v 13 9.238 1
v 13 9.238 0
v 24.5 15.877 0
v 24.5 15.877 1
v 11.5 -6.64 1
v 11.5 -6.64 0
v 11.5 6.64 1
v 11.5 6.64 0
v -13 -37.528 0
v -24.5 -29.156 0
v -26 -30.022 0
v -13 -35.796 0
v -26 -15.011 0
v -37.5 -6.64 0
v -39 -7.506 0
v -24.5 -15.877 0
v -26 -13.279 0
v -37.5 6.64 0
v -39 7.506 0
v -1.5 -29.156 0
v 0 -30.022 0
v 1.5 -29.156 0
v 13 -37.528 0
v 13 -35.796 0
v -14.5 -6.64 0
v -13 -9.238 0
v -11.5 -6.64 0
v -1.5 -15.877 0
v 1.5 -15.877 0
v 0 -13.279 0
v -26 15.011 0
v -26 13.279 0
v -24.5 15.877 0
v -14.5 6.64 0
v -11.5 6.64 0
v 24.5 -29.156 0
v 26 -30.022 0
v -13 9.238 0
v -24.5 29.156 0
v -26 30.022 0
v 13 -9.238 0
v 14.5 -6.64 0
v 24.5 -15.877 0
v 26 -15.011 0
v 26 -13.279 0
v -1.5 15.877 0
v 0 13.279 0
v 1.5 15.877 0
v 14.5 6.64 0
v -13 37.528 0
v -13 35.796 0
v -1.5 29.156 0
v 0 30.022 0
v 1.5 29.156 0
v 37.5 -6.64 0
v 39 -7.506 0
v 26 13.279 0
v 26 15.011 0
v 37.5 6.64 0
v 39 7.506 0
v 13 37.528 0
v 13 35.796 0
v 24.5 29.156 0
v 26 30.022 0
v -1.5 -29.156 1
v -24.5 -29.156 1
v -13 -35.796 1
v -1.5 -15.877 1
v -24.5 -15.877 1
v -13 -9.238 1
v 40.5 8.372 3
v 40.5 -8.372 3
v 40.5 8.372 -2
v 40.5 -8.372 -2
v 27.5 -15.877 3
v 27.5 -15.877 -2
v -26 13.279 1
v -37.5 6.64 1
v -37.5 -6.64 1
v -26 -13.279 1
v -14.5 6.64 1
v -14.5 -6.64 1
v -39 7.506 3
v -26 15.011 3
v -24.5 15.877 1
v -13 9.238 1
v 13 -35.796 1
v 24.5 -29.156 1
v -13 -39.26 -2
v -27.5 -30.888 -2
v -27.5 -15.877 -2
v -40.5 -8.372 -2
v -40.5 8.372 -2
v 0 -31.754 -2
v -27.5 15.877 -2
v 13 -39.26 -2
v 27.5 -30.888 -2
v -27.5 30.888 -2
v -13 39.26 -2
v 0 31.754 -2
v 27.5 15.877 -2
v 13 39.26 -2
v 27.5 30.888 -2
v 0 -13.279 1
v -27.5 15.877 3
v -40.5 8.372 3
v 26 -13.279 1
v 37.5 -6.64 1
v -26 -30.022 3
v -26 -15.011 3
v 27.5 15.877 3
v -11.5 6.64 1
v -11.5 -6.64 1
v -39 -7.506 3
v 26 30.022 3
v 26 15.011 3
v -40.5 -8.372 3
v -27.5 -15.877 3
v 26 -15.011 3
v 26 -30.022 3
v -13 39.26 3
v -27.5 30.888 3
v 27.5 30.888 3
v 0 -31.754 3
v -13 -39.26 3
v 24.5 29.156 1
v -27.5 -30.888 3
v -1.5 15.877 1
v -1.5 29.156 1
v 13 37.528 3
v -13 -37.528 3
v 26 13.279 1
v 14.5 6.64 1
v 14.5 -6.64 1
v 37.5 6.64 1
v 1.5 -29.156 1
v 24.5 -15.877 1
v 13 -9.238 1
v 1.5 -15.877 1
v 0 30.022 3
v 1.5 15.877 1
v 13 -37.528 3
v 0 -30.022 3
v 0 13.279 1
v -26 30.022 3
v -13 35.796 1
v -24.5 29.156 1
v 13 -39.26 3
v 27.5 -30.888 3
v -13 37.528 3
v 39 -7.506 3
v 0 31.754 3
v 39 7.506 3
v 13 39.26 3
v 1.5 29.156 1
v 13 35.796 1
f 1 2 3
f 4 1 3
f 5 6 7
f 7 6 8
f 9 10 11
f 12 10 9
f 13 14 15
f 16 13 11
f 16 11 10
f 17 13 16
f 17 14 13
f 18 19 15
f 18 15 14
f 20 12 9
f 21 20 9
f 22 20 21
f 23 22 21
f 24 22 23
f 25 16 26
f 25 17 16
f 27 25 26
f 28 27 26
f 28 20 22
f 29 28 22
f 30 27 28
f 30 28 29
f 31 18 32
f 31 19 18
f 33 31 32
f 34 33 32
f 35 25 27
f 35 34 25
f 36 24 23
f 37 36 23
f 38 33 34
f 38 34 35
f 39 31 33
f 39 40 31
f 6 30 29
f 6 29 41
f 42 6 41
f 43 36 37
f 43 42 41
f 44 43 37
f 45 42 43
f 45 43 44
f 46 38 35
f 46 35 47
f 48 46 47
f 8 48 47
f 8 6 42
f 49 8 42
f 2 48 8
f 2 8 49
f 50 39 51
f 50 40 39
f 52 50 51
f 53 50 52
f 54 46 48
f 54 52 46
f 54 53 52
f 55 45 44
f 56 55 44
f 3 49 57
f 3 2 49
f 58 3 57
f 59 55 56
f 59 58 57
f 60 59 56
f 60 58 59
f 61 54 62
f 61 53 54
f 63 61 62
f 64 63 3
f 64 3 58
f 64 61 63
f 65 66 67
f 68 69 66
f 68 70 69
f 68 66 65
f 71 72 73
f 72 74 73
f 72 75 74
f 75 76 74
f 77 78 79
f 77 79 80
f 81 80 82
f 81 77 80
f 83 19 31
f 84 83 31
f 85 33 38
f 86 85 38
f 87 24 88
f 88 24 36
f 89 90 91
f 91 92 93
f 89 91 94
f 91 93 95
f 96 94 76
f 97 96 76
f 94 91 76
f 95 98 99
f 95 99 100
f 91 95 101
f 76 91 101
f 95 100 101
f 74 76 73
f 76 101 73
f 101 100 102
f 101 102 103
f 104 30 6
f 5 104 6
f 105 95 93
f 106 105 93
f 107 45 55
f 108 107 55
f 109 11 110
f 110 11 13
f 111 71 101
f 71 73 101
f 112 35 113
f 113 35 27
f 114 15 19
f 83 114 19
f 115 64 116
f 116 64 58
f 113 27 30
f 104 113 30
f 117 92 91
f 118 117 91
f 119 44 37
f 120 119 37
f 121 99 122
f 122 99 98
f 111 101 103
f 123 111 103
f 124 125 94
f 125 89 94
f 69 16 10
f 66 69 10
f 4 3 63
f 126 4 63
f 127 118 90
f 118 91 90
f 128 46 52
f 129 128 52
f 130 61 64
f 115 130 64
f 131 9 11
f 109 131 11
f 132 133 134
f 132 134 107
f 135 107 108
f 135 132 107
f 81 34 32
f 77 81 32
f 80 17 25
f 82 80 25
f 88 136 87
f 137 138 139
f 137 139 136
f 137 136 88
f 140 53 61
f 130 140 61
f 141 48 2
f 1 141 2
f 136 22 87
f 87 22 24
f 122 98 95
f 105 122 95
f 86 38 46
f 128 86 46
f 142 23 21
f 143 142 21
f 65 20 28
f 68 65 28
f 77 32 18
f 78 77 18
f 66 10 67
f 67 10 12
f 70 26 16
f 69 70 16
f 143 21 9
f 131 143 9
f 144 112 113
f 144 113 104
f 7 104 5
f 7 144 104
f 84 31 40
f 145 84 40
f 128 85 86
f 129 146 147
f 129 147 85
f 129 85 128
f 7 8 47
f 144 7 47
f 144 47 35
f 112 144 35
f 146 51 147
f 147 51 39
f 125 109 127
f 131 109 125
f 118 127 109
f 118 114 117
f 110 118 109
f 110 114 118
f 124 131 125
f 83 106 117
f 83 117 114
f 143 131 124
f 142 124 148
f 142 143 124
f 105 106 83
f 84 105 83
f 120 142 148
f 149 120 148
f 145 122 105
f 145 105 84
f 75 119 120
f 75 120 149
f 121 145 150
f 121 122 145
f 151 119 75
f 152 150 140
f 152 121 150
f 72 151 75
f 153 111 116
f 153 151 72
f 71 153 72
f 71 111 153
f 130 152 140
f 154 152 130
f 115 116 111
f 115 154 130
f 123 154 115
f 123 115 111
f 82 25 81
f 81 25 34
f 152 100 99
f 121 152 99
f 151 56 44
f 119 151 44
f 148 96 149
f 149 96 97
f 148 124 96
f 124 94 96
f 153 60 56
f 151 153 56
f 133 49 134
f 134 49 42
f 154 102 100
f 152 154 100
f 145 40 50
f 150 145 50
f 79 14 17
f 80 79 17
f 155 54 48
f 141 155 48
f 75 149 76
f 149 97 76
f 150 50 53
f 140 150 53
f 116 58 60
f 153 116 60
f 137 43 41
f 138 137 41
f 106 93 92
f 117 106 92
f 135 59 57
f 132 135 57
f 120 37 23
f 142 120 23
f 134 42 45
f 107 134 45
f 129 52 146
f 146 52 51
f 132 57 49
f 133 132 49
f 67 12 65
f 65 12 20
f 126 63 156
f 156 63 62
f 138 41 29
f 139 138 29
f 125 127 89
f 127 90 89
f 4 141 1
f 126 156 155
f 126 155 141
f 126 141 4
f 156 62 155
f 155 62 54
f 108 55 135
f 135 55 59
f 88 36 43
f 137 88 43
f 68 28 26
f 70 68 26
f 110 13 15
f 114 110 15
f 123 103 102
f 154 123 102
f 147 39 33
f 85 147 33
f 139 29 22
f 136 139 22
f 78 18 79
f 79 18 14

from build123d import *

# Parameters (mm, degrees)
F1_DEPTH = 2
F2_DEPTH = 1
F3_DEPTH = 3


with BuildPart() as f1:
    # F0 (on Top) → F1 (new body)
    with BuildSketch(Plane.XY):
        Polygon((-40.5, -8.371579), (-27.5, -15.877132), (-27.5, -30.888239), (-13, -39.259818), (0, -31.754265), (13, -39.259818), (27.5, -30.888239), (27.5, -15.877132), (40.5, -8.371579), (40.5, 8.371579), (27.5, 15.877132), (27.5, 30.888239), (13, 39.259818), (0, 31.754265), (-13, 39.259818), (-27.5, 30.888239), (-27.5, 15.877132), (-40.5, 8.371579), align=None)
        Polygon((-39, -7.505553), (-39, 7.505553), (-26, 15.011107), (-26, 30.022214), (-13, 37.527767), (0, 30.022214), (13, 37.527767), (26, 30.022214), (26, 15.011107), (39, 7.505553), (39, -7.505553), (26, -15.011107), (26, -30.022214), (13, -37.527767), (0, -30.022214), (-13, -37.527767), (-26, -30.022214), (-26, -15.011107), align=None, mode=Mode.SUBTRACT)
        Polygon((-26, 15.011107), (-39, 7.505553), (-39, -7.505553), (-26, -15.011107), (-26, -30.022214), (-13, -37.527767), (0, -30.022214), (13, -37.527767), (26, -30.022214), (26, -15.011107), (39, -7.505553), (39, 7.505553), (26, 15.011107), (26, 30.022214), (13, 37.527767), (0, 30.022214), (-13, 37.527767), (-26, 30.022214), align=None)
        Polygon((-13, -35.795717), (-24.5, -29.156189), (-24.5, -15.877132), (-13, -9.237604), (-1.5, -15.877132), (-1.5, -29.156189), align=None, mode=Mode.SUBTRACT)
        Polygon((-26, -13.279056), (-37.5, -6.639528), (-37.5, 6.639528), (-26, 13.279056), (-14.5, 6.639528), (-14.5, -6.639528), align=None, mode=Mode.SUBTRACT)
        Polygon((13, -9.237604), (24.5, -15.877132), (24.5, -29.156189), (13, -35.795717), (1.5, -29.156189), (1.5, -15.877132), align=None, mode=Mode.SUBTRACT)
        Polygon((0, 13.279056), (11.5, 6.639528), (11.5, -6.639528), (0, -13.279056), (-11.5, -6.639528), (-11.5, 6.639528), align=None, mode=Mode.SUBTRACT)
        Polygon((26, 13.279056), (37.5, 6.639528), (37.5, -6.639528), (26, -13.279056), (14.5, -6.639528), (14.5, 6.639528), align=None, mode=Mode.SUBTRACT)
        Polygon((-13, 35.795717), (-1.5, 29.156189), (-1.5, 15.877132), (-13, 9.237604), (-24.5, 15.877132), (-24.5, 29.156189), align=None, mode=Mode.SUBTRACT)
        Polygon((13, 35.795717), (24.5, 29.156189), (24.5, 15.877132), (13, 9.237604), (1.5, 15.877132), (1.5, 29.156189), align=None, mode=Mode.SUBTRACT)
        Polygon((-37.5, 6.639528), (-37.5, -6.639528), (-26, -13.279056), (-14.5, -6.639528), (-14.5, 6.639528), (-26, 13.279056), align=None)
        Polygon((-1.5, 15.877132), (-1.5, 29.156189), (-13, 35.795717), (-24.5, 29.156189), (-24.5, 15.877132), (-13, 9.237604), align=None)
        Polygon((24.5, 15.877132), (24.5, 29.156189), (13, 35.795717), (1.5, 29.156189), (1.5, 15.877132), (13, 9.237604), align=None)
        Polygon((24.5, -29.156189), (24.5, -15.877132), (13, -9.237604), (1.5, -15.877132), (1.5, -29.156189), (13, -35.795717), align=None)
        Polygon((-24.5, -15.877132), (-24.5, -29.156189), (-13, -35.795717), (-1.5, -29.156189), (-1.5, -15.877132), (-13, -9.237604), align=None)
        Polygon((11.5, -6.639528), (11.5, 6.639528), (0, 13.279056), (-11.5, 6.639528), (-11.5, -6.639528), (0, -13.279056), align=None)
        Polygon((37.5, -6.639528), (37.5, 6.639528), (26, 13.279056), (14.5, 6.639528), (14.5, -6.639528), (26, -13.279056), align=None)
    extrude(amount=-F1_DEPTH)

    # F0 (on Top) → F2 (join)
    with BuildSketch(Plane.XY):
        Polygon((-37.5, 6.639528), (-37.5, -6.639528), (-26, -13.279056), (-14.5, -6.639528), (-14.5, 6.639528), (-26, 13.279056), align=None)
        Polygon((-1.5, 15.877132), (-1.5, 29.156189), (-13, 35.795717), (-24.5, 29.156189), (-24.5, 15.877132), (-13, 9.237604), align=None)
        Polygon((24.5, 15.877132), (24.5, 29.156189), (13, 35.795717), (1.5, 29.156189), (1.5, 15.877132), (13, 9.237604), align=None)
        Polygon((37.5, -6.639528), (37.5, 6.639528), (26, 13.279056), (14.5, 6.639528), (14.5, -6.639528), (26, -13.279056), align=None)
        Polygon((24.5, -29.156189), (24.5, -15.877132), (13, -9.237604), (1.5, -15.877132), (1.5, -29.156189), (13, -35.795717), align=None)
        Polygon((-24.5, -15.877132), (-24.5, -29.156189), (-13, -35.795717), (-1.5, -29.156189), (-1.5, -15.877132), (-13, -9.237604), align=None)
        Polygon((11.5, -6.639528), (11.5, 6.639528), (0, 13.279056), (-11.5, 6.639528), (-11.5, -6.639528), (0, -13.279056), align=None)
    extrude(amount=F2_DEPTH)

    # F0 (on Top) → F3 (join)
    with BuildSketch(Plane.XY):
        Polygon((-40.5, -8.371579), (-27.5, -15.877132), (-27.5, -30.888239), (-13, -39.259818), (0, -31.754265), (13, -39.259818), (27.5, -30.888239), (27.5, -15.877132), (40.5, -8.371579), (40.5, 8.371579), (27.5, 15.877132), (27.5, 30.888239), (13, 39.259818), (0, 31.754265), (-13, 39.259818), (-27.5, 30.888239), (-27.5, 15.877132), (-40.5, 8.371579), align=None)
        Polygon((-39, -7.505553), (-39, 7.505553), (-26, 15.011107), (-26, 30.022214), (-13, 37.527767), (0, 30.022214), (13, 37.527767), (26, 30.022214), (26, 15.011107), (39, 7.505553), (39, -7.505553), (26, -15.011107), (26, -30.022214), (13, -37.527767), (0, -30.022214), (-13, -37.527767), (-26, -30.022214), (-26, -15.011107), align=None, mode=Mode.SUBTRACT)
    extrude(amount=F3_DEPTH)


solid = f1.part
